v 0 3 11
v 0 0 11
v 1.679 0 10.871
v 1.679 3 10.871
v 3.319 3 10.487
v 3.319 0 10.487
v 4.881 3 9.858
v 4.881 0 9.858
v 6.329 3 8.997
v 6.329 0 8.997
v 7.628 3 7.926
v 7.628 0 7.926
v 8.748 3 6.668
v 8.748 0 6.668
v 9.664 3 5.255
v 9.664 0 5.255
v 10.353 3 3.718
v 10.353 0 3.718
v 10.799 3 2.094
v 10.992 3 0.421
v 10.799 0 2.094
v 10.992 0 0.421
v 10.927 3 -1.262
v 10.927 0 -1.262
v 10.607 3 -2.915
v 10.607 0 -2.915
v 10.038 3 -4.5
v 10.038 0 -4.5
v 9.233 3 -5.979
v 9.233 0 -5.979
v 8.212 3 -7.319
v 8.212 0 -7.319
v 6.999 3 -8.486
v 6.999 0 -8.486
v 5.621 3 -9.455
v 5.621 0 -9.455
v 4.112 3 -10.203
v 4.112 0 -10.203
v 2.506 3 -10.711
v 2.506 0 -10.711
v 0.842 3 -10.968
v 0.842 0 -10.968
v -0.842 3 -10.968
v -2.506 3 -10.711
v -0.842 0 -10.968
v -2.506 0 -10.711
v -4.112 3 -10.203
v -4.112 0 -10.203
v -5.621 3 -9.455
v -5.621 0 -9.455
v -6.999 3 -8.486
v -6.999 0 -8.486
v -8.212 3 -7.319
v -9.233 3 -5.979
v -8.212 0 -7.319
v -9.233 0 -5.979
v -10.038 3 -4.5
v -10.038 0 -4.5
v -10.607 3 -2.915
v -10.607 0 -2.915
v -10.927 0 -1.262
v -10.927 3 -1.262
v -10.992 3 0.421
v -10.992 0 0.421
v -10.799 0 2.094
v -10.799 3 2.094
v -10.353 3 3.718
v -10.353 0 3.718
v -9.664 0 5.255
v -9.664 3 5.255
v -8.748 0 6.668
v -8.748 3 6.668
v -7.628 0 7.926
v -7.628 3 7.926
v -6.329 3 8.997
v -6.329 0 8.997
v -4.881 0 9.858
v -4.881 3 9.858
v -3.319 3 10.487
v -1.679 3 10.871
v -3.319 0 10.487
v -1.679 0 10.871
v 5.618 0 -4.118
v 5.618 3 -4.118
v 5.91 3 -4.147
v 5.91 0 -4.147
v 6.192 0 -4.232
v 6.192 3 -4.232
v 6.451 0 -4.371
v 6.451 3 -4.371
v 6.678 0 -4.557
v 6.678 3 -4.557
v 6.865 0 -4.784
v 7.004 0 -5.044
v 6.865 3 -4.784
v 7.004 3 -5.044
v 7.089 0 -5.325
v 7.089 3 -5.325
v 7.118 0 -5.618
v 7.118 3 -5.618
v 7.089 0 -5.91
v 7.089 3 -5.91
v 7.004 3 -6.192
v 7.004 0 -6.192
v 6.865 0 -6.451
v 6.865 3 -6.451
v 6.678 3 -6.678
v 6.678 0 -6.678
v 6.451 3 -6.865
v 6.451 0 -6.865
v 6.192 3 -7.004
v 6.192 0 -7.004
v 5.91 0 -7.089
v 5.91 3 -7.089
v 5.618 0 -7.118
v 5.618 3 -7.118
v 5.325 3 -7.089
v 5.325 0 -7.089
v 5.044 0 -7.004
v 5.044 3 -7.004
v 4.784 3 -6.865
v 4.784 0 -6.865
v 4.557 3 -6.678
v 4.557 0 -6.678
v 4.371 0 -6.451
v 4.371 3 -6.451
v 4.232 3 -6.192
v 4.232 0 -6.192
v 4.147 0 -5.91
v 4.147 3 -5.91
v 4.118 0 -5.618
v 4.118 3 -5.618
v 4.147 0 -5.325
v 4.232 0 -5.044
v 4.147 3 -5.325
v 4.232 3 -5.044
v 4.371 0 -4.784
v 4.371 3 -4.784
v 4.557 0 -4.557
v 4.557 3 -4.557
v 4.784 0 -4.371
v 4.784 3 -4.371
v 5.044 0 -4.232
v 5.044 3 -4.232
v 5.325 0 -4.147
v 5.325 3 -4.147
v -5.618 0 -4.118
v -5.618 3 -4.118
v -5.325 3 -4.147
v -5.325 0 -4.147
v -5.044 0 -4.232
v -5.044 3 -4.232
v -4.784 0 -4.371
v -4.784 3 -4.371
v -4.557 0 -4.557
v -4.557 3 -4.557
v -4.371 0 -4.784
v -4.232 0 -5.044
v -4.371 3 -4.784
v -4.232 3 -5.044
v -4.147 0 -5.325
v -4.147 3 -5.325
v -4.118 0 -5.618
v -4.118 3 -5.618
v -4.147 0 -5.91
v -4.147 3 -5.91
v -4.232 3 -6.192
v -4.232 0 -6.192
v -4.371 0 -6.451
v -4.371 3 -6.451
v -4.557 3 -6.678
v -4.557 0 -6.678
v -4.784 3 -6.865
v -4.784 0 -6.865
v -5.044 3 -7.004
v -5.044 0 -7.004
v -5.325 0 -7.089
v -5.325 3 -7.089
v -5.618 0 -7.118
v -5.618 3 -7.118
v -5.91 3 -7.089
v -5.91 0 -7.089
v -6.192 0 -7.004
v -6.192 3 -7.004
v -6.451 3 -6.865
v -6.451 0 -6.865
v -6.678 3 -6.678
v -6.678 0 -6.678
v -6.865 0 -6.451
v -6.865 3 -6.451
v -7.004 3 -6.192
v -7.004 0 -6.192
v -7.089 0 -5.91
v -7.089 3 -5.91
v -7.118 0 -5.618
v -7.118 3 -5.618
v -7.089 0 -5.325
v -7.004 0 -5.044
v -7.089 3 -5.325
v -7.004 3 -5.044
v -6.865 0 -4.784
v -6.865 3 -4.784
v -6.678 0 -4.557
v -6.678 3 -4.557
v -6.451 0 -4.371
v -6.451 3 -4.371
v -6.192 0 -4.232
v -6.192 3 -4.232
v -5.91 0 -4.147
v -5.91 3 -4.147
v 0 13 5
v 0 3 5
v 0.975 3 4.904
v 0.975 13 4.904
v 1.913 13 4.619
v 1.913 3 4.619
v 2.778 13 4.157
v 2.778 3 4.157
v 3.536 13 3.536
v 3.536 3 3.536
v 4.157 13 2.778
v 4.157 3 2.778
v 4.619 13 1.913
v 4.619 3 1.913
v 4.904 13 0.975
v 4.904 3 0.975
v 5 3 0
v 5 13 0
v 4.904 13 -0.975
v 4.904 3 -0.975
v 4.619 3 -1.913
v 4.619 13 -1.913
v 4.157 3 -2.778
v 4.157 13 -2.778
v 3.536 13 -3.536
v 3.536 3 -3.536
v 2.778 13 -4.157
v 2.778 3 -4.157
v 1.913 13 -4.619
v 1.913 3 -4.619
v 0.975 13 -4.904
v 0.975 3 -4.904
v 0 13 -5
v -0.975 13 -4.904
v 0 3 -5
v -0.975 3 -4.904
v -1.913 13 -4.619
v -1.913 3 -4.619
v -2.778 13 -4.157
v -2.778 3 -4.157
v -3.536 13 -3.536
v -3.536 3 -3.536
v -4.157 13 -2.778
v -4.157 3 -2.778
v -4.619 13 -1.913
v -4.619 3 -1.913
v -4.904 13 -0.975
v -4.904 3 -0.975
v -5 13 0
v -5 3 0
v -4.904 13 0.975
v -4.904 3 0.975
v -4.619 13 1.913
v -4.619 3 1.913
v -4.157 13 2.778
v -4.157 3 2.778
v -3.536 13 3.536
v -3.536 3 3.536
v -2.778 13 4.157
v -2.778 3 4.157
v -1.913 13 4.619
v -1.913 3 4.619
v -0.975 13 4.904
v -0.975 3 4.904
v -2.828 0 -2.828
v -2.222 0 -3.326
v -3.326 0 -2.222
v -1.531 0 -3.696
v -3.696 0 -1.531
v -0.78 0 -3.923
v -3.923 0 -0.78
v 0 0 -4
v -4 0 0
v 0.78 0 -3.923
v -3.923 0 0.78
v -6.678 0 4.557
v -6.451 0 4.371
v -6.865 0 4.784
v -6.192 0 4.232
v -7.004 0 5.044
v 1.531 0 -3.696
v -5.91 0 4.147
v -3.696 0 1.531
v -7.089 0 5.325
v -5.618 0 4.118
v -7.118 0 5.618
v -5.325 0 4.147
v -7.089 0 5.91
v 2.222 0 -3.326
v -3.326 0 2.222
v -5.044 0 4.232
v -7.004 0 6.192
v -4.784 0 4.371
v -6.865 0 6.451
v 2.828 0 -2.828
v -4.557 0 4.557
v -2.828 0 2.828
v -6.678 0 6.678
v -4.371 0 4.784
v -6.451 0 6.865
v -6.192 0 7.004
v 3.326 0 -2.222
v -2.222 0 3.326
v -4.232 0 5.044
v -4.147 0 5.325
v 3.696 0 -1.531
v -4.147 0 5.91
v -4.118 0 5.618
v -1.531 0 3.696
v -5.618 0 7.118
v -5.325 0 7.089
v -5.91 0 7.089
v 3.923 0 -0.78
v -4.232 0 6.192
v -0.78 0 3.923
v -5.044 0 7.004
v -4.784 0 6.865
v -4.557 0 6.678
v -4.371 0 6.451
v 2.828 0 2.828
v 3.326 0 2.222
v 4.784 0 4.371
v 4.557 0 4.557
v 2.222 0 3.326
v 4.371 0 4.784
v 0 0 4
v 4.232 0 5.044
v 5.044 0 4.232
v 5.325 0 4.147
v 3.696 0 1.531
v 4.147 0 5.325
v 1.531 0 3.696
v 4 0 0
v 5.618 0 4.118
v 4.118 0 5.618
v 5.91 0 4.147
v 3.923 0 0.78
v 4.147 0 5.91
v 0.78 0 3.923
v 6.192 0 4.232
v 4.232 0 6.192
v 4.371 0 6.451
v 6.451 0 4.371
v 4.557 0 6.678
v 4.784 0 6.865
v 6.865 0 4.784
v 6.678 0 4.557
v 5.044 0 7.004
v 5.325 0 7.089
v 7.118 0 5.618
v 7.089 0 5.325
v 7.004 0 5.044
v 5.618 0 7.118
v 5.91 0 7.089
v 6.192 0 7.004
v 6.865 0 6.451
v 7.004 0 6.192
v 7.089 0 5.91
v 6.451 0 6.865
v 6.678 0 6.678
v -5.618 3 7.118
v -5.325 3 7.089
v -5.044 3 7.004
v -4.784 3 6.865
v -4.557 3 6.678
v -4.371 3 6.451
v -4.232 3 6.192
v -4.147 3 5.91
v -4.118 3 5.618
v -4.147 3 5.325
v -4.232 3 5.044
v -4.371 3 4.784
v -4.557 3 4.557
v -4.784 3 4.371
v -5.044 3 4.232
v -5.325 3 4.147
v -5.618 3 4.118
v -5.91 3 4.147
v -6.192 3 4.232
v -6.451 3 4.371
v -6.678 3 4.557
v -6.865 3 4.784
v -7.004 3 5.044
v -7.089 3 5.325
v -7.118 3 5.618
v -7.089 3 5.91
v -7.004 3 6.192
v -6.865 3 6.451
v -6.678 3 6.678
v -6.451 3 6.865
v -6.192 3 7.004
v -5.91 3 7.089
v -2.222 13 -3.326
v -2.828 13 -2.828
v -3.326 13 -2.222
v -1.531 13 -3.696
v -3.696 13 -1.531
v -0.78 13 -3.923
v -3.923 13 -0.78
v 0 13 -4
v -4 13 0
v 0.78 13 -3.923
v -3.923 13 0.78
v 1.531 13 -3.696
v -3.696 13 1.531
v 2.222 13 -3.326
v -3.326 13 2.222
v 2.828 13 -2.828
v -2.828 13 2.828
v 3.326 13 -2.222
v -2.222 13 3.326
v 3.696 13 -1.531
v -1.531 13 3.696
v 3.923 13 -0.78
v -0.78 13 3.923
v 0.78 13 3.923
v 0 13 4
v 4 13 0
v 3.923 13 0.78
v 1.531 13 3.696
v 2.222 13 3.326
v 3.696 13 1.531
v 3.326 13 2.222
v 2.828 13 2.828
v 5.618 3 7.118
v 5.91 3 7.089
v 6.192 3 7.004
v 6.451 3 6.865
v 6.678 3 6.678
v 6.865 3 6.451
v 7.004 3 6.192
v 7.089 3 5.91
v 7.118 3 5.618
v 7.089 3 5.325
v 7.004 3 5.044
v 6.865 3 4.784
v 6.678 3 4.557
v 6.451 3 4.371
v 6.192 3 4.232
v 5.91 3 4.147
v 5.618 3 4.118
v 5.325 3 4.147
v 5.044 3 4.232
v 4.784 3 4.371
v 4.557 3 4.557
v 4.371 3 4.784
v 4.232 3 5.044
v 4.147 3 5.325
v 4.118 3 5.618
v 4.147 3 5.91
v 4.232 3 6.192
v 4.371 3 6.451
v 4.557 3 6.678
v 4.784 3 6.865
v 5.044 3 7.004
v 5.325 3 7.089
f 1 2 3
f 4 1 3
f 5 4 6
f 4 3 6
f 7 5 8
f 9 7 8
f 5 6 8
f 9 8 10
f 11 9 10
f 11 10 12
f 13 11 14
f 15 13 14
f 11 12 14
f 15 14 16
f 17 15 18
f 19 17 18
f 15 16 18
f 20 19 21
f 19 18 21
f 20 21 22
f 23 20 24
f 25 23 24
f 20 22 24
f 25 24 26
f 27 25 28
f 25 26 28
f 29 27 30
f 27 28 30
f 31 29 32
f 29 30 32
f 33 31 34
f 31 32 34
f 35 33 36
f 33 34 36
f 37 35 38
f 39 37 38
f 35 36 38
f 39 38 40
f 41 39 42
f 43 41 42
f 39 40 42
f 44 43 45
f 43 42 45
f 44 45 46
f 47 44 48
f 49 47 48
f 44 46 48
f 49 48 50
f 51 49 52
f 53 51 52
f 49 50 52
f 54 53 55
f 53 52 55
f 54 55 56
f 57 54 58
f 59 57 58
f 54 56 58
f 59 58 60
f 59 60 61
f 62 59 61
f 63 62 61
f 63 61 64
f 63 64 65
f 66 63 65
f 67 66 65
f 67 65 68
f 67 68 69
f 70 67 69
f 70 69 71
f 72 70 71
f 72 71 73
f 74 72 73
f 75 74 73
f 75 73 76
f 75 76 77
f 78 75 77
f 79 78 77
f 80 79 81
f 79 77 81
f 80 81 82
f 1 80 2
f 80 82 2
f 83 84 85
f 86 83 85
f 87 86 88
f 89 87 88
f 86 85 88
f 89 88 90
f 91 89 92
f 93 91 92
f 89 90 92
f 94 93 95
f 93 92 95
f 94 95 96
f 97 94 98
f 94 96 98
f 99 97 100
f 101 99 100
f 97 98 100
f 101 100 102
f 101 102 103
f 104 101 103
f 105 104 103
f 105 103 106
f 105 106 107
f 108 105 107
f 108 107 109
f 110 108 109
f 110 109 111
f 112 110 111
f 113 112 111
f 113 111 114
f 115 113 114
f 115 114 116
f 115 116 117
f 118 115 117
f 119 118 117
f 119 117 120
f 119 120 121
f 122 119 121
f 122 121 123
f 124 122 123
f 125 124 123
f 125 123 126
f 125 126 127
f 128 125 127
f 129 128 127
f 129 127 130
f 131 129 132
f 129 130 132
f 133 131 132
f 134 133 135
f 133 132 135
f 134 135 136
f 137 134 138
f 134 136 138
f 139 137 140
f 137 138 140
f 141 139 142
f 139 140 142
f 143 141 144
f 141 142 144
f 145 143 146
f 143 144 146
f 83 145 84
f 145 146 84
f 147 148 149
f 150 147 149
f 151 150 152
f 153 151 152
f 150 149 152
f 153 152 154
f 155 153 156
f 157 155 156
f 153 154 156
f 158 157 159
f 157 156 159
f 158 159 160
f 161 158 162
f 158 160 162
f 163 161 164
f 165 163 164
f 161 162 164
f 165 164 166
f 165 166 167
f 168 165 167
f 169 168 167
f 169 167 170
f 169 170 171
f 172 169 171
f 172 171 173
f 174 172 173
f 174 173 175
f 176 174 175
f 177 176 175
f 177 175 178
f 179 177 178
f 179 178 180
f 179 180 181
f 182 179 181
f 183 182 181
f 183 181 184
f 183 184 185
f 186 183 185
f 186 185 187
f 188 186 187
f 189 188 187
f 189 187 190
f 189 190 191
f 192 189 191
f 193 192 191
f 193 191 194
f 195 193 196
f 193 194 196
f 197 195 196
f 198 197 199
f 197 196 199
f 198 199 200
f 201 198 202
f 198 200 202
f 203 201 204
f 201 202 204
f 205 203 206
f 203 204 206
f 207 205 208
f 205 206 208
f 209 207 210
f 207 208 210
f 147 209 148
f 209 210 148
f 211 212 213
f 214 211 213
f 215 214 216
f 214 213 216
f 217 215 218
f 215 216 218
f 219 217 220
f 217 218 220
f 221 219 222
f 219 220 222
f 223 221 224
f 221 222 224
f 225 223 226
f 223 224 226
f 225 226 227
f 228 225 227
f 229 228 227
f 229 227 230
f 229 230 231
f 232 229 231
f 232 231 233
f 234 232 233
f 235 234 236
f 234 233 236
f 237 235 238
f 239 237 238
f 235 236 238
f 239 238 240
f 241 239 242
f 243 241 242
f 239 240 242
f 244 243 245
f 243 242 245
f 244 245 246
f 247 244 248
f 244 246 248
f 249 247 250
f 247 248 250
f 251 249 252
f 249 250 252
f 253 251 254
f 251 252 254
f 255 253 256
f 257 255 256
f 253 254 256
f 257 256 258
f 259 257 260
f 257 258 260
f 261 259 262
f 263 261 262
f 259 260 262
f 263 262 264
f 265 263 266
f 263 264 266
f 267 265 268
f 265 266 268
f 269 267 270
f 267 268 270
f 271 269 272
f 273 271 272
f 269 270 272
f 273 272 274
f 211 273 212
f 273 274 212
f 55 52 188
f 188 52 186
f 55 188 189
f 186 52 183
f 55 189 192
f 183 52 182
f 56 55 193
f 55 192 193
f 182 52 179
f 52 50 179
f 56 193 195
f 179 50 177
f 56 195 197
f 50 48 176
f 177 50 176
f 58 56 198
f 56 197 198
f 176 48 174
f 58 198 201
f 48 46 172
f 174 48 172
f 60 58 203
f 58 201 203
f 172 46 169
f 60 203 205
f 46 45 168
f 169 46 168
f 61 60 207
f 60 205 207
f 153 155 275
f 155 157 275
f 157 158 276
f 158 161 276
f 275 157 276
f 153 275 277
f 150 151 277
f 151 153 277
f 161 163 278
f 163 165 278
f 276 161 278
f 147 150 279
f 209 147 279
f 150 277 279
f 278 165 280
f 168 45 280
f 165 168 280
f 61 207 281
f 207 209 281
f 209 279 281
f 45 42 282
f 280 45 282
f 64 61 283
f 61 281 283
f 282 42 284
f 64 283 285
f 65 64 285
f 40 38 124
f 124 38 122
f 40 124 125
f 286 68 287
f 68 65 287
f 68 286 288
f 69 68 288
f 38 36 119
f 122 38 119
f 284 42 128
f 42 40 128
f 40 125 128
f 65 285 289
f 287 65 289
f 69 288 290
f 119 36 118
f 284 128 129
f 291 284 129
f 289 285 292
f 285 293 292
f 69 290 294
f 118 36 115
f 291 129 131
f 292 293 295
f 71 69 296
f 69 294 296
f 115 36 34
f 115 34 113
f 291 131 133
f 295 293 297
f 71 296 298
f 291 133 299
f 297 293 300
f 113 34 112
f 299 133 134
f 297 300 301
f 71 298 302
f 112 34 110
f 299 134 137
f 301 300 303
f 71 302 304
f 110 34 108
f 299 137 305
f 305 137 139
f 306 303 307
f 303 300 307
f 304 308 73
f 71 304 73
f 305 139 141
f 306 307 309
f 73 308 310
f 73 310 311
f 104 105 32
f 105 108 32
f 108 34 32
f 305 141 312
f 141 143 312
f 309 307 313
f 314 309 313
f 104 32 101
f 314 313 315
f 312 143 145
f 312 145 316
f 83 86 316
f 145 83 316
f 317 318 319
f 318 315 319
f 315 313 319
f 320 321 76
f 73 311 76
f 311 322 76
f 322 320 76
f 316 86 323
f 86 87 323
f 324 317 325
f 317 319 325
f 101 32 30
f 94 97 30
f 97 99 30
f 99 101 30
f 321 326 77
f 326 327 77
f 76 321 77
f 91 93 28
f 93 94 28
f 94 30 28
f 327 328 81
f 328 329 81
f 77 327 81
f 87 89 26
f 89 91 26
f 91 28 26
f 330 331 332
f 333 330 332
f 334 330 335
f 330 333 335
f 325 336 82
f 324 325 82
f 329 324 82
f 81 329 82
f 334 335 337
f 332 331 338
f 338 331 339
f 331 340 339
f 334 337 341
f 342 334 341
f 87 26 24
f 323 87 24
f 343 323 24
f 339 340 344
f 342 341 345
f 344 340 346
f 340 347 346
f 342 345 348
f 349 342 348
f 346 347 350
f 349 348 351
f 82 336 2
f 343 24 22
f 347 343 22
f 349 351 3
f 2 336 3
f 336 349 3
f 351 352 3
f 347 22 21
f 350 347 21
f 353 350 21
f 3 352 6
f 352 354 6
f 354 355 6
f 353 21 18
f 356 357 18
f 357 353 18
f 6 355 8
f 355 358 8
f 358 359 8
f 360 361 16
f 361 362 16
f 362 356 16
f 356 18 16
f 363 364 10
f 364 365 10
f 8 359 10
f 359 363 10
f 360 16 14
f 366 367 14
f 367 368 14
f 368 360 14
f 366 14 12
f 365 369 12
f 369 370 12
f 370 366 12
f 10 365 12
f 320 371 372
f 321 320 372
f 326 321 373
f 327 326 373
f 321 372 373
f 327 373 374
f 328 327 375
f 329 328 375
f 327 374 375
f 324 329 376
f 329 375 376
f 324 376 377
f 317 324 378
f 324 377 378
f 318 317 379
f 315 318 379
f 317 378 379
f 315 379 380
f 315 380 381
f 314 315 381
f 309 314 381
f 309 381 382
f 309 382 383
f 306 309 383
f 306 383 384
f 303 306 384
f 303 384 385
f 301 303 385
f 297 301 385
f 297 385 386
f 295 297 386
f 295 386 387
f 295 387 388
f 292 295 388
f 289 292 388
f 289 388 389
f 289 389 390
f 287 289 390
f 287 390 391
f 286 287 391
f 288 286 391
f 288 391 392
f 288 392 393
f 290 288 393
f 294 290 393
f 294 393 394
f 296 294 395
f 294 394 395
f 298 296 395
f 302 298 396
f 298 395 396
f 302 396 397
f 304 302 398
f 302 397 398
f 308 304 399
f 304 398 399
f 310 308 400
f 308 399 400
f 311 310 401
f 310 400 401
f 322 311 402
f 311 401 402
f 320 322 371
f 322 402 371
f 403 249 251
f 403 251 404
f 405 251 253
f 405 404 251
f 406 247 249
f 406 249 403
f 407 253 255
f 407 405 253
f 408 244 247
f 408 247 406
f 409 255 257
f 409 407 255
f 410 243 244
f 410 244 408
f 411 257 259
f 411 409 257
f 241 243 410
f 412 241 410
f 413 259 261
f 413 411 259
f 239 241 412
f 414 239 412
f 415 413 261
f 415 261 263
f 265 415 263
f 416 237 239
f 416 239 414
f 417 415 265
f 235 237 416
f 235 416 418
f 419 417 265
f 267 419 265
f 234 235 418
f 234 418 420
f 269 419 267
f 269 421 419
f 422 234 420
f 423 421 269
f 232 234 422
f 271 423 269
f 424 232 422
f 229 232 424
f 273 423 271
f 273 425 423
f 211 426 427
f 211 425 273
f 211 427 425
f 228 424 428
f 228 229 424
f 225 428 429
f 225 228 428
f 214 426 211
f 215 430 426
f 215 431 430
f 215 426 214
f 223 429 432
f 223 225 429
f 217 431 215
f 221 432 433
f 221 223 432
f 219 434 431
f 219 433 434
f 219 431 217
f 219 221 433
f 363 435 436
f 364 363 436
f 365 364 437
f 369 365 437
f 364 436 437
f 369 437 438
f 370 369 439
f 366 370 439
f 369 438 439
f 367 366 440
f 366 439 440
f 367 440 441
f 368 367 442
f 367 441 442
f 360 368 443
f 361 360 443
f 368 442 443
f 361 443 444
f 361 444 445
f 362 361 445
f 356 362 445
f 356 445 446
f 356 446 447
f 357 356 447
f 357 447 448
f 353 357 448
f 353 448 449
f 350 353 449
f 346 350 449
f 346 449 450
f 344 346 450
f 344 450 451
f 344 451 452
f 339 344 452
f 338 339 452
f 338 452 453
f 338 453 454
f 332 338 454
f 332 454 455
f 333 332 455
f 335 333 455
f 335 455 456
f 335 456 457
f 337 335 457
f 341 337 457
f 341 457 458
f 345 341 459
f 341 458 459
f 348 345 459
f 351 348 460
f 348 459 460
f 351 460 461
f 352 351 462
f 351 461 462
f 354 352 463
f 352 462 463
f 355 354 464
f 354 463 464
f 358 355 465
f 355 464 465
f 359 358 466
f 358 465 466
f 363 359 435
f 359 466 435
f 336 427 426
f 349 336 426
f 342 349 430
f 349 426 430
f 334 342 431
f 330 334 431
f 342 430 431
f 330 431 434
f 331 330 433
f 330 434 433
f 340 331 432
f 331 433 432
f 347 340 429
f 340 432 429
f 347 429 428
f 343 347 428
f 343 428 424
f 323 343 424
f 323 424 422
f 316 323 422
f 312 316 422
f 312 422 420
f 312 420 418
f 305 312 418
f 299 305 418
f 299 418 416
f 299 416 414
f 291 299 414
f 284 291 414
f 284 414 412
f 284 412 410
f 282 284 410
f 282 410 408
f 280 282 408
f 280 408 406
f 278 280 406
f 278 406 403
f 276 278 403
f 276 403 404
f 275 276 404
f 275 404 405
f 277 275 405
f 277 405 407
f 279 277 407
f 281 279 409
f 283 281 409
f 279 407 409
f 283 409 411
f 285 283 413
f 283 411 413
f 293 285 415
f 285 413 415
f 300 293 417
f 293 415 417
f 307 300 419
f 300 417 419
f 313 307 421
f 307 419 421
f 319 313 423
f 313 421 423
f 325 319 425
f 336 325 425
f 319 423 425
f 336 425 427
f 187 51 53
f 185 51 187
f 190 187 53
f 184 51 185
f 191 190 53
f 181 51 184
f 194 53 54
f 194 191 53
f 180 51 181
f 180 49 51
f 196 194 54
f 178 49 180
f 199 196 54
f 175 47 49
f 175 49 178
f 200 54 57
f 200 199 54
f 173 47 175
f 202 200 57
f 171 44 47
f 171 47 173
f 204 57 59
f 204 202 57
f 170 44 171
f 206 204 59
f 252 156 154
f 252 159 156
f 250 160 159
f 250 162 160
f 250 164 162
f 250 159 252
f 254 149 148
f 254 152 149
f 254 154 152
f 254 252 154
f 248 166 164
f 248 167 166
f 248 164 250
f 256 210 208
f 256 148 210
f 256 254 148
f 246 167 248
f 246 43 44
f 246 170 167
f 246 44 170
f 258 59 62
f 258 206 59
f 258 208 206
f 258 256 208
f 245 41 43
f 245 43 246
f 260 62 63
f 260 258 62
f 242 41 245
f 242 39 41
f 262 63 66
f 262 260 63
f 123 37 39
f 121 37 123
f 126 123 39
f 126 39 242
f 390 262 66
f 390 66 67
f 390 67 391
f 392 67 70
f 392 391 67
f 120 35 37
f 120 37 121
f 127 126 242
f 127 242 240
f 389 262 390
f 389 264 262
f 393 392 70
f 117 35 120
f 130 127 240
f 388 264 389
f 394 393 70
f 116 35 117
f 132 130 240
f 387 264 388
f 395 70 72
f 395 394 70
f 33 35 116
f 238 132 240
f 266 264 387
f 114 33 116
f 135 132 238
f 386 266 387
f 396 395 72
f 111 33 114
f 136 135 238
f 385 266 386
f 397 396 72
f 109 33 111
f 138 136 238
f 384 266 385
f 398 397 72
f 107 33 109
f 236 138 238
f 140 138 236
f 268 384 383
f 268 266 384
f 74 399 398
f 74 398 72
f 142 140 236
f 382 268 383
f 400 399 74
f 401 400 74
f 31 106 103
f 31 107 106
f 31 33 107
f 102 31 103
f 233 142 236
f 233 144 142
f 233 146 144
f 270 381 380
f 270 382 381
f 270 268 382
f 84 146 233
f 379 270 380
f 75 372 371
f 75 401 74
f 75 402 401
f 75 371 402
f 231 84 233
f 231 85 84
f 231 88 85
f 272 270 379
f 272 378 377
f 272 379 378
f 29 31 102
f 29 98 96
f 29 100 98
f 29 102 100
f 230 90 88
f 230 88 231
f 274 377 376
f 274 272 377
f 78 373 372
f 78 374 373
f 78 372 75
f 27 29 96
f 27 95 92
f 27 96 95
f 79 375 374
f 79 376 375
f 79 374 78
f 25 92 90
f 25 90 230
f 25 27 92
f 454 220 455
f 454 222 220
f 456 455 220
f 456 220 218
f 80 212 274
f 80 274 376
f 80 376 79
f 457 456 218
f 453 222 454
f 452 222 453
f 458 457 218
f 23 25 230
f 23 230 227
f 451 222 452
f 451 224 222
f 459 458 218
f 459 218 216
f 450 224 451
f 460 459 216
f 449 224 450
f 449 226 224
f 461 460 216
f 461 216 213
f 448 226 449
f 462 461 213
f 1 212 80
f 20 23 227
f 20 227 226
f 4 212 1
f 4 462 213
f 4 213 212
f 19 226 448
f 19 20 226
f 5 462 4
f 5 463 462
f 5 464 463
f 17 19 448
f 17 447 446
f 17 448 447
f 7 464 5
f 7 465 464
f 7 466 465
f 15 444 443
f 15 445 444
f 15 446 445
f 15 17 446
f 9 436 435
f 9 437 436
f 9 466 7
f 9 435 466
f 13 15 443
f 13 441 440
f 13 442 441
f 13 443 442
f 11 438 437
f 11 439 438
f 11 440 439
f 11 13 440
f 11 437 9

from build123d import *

# Parameters (mm, degrees)
SKETCH1_R           = 11
BOSS_EXTRUDE1_DEPTH = 3
SKETCH2_R           = 1.5
CUT_EXTRUDE1_DEPTH  = 5
SKETCH3_R           = 5
BOSS_EXTRUDE2_DEPTH = 10
SKETCH4_R           = 4
CUT_EXTRUDE2_DEPTH  = 21.273134933


with BuildPart() as part:
    # Sketch1 → Boss-Extrude1 (new body)
    with BuildSketch(Plane(origin=(0, 0, 0), x_dir=(1, 0, 0), z_dir=(0, 1, 0))):
        with Locations(Location((0, 0, 0), (0, 0, 270))):
            Circle(SKETCH1_R)
    extrude(amount=BOSS_EXTRUDE1_DEPTH)

    # Sketch2 → Cut-Extrude1 (cut)
    with BuildSketch(Plane(origin=(0, 3, 0), x_dir=(1, 0, 0), z_dir=(0, 1, 0))):
        with Locations(Location((-5.617707867, 5.617707867, 0), (0, 0, 270))):
            Circle(SKETCH2_R)
        with Locations(Location((5.617707867, 5.617707867, 0), (0, 0, 270))):
            Circle(SKETCH2_R)
        with Locations(Location((-5.617707867, -5.617707867, 0), (0, 0, 270))):
            Circle(SKETCH2_R)
        with Locations(Location((5.617707867, -5.617707867, 0), (0, 0, 270))):
            Circle(SKETCH2_R)
    extrude(amount=-CUT_EXTRUDE1_DEPTH, mode=Mode.SUBTRACT)

    # Sketch3 → Boss-Extrude2 (add)
    with BuildSketch(Plane(origin=(0, 3, 0), x_dir=(1, 0, 0), z_dir=(0, 1, 0))):
        with Locations(Location((0, 0, 0), (0, 0, 270))):
            Circle(SKETCH3_R)
    extrude(amount=BOSS_EXTRUDE2_DEPTH)

    # Sketch4 → Cut-Extrude2 (cut, through all)
    with BuildSketch(Plane(origin=(0, 13, 0), x_dir=(1, 0, 0), z_dir=(0, 1, 0))):
        with Locations(Location((0, 0, 0), (0, 0, 270))):
            Circle(SKETCH4_R)
    extrude(amount=-CUT_EXTRUDE2_DEPTH, mode=Mode.SUBTRACT)


solid = part.part
